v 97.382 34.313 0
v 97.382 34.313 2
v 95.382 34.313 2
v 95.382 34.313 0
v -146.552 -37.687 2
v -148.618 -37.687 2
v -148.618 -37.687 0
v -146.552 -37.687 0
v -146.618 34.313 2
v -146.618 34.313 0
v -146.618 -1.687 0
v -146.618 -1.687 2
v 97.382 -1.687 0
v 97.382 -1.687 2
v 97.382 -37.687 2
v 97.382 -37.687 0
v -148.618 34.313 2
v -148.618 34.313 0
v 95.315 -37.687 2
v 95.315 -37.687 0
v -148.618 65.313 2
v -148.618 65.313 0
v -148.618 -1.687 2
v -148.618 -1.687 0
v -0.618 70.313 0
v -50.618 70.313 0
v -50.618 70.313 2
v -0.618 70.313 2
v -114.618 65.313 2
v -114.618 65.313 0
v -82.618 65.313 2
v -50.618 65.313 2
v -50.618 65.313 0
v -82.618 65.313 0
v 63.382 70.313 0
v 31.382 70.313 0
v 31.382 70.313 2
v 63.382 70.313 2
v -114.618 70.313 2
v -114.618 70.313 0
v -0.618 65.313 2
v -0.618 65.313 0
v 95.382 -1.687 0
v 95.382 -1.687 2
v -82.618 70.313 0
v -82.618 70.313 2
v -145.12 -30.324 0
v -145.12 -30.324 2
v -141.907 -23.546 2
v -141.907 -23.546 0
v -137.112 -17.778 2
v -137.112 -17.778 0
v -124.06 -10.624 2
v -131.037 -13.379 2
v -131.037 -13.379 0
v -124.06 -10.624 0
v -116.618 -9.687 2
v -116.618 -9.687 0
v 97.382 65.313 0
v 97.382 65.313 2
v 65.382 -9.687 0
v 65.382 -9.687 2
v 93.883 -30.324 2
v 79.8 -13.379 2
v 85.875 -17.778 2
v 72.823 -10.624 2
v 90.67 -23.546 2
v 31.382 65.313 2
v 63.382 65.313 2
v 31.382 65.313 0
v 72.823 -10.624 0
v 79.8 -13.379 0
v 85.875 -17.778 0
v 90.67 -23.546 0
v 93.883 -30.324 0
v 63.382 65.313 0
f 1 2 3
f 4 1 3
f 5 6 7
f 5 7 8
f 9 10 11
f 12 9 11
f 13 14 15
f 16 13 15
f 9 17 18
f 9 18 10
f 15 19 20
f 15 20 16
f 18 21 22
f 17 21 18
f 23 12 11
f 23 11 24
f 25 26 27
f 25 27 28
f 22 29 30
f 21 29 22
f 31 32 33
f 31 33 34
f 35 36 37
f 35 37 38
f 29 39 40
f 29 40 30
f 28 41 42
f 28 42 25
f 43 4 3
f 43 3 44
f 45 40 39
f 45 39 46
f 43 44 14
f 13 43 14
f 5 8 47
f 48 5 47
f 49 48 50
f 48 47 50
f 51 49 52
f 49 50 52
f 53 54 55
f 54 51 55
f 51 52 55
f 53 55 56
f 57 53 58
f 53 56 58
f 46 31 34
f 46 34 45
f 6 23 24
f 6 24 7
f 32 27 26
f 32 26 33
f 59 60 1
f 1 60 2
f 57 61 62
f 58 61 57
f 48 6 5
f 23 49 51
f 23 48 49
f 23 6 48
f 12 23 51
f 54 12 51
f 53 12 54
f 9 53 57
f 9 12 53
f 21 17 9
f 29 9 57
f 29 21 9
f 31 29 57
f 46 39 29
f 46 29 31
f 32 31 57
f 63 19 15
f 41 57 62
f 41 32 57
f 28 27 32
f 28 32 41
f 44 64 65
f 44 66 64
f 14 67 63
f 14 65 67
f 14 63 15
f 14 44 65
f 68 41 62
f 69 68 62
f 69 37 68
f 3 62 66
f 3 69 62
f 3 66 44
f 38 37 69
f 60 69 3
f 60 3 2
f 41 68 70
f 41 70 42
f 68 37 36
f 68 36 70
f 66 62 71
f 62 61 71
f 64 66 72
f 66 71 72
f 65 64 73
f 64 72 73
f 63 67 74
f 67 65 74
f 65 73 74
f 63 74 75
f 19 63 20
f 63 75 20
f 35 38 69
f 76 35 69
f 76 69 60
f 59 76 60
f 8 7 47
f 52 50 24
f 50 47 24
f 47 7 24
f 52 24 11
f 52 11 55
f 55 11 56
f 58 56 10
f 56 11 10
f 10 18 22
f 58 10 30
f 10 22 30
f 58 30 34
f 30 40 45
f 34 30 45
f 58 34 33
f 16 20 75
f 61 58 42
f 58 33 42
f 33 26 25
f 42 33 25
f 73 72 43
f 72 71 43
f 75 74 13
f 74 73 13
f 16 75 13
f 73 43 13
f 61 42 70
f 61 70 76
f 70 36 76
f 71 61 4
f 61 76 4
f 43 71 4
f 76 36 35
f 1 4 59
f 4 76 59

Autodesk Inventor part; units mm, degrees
ref_plane "YZ Plane" through (0, 0, 0) normal (1, 0, 0) x (0, 1, 0)
ref_plane "XZ Plane" through (0, 0, 0) normal (0, 1, 0) x (-1, 0, 0)
ref_plane "XY Plane" through (0, 0, 0) normal (0, 0, 1) x (1, 0, 0)
sketch "Sketch1" plane through (0, 0, 0) normal (0, 0, 1) x (1, 0, 0)
  line L0 (-146.6185, 70.3133) -> (95.3815, 70.3133)
  line L1 (95.3815, 70.3133) -> (95.3815, -9.6867)
  line L2 (2.9423, -9.6867) -> (-45.2664, -9.6867)
  line L3 (-146.6185, -9.6867) -> (-146.6185, 70.3133)
  line L4 (-116.6185, -9.6867) -> (-45.2664, -9.6867)
  line L5 (65.3815, -9.6867) -> (2.9423, -9.6867)
  arc A0 (-116.6185, -9.6867) -> (-146.6185, -39.6867) centre (-116.6185, -39.6867) ccw
  arc A1 (95.3815, -39.6867) -> (65.3815, -9.6867) centre (65.3815, -39.6867) ccw
  line L6 (-146.6185, -9.6867) -> (-146.6185, -39.6867)
  line L7 (95.3815, -9.6867) -> (95.3815, -39.6867)
  point P0 (0, 0)
  dimension "d0" = 242
  dimension "d1" = 80
  dimension "d2" = 30
extrude "Extrusion1" add sketch "Sketch1" along normal blind 2
sketch "Sketch2" plane through (0, 0, 2) normal (0, 0, 1) x (1, 0, 0)
  line L0 (95.3815, 70.3133) -> (-146.6185, 70.3133) projected
  line L1 (-146.6185, 70.3133) -> (-114.6185, 70.3133)
  line L2 (-114.6185, 70.3133) -> (-114.6185, 65.3133)
  line L3 (-114.6185, 65.3133) -> (-146.6185, 65.3133)
  line L4 (-146.6185, 65.3133) -> (-146.6185, 70.3133)
  line L5 (-82.6185, 70.3133) -> (-50.6185, 70.3133)
  line L6 (-50.6185, 70.3133) -> (-50.6185, 65.3133)
  line L7 (-50.6185, 65.3133) -> (-82.6185, 65.3133)
  line L8 (-82.6185, 65.3133) -> (-82.6185, 70.3133)
  line L9 (-0.6185, 70.3133) -> (31.3815, 70.3133)
  line L10 (31.3815, 70.3133) -> (31.3815, 65.3133)
  line L11 (31.3815, 65.3133) -> (-0.6185, 65.3133)
  line L12 (-0.6185, 65.3133) -> (-0.6185, 70.3133)
  line L13 (95.3815, -39.6867) -> (95.3815, 70.3133) projected
  line L14 (95.3815, 70.3133) -> (63.3815, 70.3133)
  line L15 (63.3815, 70.3133) -> (63.3815, 65.3133)
  line L16 (63.3815, 65.3133) -> (95.3815, 65.3133)
  line L17 (95.3815, 65.3133) -> (95.3815, 70.3133)
  point P0 (0, 0)
  dimension "d5" = 32
  dimension "d6" = 32
  dimension "d7" = 32
  dimension "d8" = 32
  dimension "d9" = 32
  dimension "d10" = 32
  dimension "d11" = 50
  dimension "d12" = 5
extrude "Extrusion2" cut sketch "Sketch2" against normal blind 2
sketch "Sketch3" plane through (0, 0, 2) normal (0, 0, 1) x (1, 0, 0)
  line L0 (-146.6185, 65.3133) -> (-146.6185, -39.6867) projected
  line L1 (-146.6185, 65.3133) -> (-148.6185, 65.3133)
  line L2 (-148.6185, 65.3133) -> (-148.6185, 34.3133)
  line L3 (-148.6185, 34.3133) -> (-146.6185, 34.3133)
  line L4 (-146.6185, 34.3133) -> (-146.6185, 65.3133)
  line L5 (-146.6185, -1.6867) -> (-148.6185, -1.6867)
  line L6 (-148.6185, -1.6867) -> (-148.6185, -37.6867)
  line L7 (-146.6185, -37.6867) -> (-146.6185, -1.6867)
  line L8 (95.3815, -39.6867) -> (95.3815, 65.3133) projected
  line L9 (95.3815, 65.3133) -> (97.3815, 65.3133)
  line L10 (97.3815, 65.3133) -> (97.3815, 34.3133)
  line L11 (97.3815, 34.3133) -> (95.3815, 34.3133)
  line L12 (95.3815, 34.3133) -> (95.3815, 65.3133)
  line L13 (95.3815, -1.6867) -> (97.3815, -1.6867)
  line L14 (97.3815, -1.6867) -> (97.3815, -37.6867)
  line L15 (95.3815, -37.6867) -> (95.3815, -1.6867)
  line L16 (-148.6185, -37.6867) -> (-146.6185, -37.6867)
  line L17 (95.3815, -39.6867) -> (95.3815, 65.3133) projected
  line L18 (95.3815, -37.6867) -> (97.3815, -37.6867)
  point P0 (-146.6185, -37.6867)
  point P1 (95.3815, -37.6867)
  dimension "d34" = 31
  dimension "d35" = 36
  dimension "d36" = 2
  dimension "d37" = 2
  dimension "d39" = 36
  dimension "d40" = 36
extrude "Extrusion3" add sketch "Sketch3" against normal blind 2
sketch "Sketch4" plane through (0, 0, 2) normal (0, 0, 1) x (1, 0, 0)
  line L0 (-148.6185, -37.6867) -> (-146.6185, -37.6867) projected
  line L1 (-148.6185, -37.6867) -> (112.9742, -37.6867)
  line L2 (112.9742, -37.6867) -> (112.9742, -65.6367)
  line L3 (112.9742, -65.6367) -> (-148.6185, -65.6367)
  line L4 (-148.6185, -65.6367) -> (-148.6185, -37.6867)
  point P0 (0, 0)
extrude "Extrusion4" cut sketch "Sketch4" against normal blind 2
properties part number "front"
